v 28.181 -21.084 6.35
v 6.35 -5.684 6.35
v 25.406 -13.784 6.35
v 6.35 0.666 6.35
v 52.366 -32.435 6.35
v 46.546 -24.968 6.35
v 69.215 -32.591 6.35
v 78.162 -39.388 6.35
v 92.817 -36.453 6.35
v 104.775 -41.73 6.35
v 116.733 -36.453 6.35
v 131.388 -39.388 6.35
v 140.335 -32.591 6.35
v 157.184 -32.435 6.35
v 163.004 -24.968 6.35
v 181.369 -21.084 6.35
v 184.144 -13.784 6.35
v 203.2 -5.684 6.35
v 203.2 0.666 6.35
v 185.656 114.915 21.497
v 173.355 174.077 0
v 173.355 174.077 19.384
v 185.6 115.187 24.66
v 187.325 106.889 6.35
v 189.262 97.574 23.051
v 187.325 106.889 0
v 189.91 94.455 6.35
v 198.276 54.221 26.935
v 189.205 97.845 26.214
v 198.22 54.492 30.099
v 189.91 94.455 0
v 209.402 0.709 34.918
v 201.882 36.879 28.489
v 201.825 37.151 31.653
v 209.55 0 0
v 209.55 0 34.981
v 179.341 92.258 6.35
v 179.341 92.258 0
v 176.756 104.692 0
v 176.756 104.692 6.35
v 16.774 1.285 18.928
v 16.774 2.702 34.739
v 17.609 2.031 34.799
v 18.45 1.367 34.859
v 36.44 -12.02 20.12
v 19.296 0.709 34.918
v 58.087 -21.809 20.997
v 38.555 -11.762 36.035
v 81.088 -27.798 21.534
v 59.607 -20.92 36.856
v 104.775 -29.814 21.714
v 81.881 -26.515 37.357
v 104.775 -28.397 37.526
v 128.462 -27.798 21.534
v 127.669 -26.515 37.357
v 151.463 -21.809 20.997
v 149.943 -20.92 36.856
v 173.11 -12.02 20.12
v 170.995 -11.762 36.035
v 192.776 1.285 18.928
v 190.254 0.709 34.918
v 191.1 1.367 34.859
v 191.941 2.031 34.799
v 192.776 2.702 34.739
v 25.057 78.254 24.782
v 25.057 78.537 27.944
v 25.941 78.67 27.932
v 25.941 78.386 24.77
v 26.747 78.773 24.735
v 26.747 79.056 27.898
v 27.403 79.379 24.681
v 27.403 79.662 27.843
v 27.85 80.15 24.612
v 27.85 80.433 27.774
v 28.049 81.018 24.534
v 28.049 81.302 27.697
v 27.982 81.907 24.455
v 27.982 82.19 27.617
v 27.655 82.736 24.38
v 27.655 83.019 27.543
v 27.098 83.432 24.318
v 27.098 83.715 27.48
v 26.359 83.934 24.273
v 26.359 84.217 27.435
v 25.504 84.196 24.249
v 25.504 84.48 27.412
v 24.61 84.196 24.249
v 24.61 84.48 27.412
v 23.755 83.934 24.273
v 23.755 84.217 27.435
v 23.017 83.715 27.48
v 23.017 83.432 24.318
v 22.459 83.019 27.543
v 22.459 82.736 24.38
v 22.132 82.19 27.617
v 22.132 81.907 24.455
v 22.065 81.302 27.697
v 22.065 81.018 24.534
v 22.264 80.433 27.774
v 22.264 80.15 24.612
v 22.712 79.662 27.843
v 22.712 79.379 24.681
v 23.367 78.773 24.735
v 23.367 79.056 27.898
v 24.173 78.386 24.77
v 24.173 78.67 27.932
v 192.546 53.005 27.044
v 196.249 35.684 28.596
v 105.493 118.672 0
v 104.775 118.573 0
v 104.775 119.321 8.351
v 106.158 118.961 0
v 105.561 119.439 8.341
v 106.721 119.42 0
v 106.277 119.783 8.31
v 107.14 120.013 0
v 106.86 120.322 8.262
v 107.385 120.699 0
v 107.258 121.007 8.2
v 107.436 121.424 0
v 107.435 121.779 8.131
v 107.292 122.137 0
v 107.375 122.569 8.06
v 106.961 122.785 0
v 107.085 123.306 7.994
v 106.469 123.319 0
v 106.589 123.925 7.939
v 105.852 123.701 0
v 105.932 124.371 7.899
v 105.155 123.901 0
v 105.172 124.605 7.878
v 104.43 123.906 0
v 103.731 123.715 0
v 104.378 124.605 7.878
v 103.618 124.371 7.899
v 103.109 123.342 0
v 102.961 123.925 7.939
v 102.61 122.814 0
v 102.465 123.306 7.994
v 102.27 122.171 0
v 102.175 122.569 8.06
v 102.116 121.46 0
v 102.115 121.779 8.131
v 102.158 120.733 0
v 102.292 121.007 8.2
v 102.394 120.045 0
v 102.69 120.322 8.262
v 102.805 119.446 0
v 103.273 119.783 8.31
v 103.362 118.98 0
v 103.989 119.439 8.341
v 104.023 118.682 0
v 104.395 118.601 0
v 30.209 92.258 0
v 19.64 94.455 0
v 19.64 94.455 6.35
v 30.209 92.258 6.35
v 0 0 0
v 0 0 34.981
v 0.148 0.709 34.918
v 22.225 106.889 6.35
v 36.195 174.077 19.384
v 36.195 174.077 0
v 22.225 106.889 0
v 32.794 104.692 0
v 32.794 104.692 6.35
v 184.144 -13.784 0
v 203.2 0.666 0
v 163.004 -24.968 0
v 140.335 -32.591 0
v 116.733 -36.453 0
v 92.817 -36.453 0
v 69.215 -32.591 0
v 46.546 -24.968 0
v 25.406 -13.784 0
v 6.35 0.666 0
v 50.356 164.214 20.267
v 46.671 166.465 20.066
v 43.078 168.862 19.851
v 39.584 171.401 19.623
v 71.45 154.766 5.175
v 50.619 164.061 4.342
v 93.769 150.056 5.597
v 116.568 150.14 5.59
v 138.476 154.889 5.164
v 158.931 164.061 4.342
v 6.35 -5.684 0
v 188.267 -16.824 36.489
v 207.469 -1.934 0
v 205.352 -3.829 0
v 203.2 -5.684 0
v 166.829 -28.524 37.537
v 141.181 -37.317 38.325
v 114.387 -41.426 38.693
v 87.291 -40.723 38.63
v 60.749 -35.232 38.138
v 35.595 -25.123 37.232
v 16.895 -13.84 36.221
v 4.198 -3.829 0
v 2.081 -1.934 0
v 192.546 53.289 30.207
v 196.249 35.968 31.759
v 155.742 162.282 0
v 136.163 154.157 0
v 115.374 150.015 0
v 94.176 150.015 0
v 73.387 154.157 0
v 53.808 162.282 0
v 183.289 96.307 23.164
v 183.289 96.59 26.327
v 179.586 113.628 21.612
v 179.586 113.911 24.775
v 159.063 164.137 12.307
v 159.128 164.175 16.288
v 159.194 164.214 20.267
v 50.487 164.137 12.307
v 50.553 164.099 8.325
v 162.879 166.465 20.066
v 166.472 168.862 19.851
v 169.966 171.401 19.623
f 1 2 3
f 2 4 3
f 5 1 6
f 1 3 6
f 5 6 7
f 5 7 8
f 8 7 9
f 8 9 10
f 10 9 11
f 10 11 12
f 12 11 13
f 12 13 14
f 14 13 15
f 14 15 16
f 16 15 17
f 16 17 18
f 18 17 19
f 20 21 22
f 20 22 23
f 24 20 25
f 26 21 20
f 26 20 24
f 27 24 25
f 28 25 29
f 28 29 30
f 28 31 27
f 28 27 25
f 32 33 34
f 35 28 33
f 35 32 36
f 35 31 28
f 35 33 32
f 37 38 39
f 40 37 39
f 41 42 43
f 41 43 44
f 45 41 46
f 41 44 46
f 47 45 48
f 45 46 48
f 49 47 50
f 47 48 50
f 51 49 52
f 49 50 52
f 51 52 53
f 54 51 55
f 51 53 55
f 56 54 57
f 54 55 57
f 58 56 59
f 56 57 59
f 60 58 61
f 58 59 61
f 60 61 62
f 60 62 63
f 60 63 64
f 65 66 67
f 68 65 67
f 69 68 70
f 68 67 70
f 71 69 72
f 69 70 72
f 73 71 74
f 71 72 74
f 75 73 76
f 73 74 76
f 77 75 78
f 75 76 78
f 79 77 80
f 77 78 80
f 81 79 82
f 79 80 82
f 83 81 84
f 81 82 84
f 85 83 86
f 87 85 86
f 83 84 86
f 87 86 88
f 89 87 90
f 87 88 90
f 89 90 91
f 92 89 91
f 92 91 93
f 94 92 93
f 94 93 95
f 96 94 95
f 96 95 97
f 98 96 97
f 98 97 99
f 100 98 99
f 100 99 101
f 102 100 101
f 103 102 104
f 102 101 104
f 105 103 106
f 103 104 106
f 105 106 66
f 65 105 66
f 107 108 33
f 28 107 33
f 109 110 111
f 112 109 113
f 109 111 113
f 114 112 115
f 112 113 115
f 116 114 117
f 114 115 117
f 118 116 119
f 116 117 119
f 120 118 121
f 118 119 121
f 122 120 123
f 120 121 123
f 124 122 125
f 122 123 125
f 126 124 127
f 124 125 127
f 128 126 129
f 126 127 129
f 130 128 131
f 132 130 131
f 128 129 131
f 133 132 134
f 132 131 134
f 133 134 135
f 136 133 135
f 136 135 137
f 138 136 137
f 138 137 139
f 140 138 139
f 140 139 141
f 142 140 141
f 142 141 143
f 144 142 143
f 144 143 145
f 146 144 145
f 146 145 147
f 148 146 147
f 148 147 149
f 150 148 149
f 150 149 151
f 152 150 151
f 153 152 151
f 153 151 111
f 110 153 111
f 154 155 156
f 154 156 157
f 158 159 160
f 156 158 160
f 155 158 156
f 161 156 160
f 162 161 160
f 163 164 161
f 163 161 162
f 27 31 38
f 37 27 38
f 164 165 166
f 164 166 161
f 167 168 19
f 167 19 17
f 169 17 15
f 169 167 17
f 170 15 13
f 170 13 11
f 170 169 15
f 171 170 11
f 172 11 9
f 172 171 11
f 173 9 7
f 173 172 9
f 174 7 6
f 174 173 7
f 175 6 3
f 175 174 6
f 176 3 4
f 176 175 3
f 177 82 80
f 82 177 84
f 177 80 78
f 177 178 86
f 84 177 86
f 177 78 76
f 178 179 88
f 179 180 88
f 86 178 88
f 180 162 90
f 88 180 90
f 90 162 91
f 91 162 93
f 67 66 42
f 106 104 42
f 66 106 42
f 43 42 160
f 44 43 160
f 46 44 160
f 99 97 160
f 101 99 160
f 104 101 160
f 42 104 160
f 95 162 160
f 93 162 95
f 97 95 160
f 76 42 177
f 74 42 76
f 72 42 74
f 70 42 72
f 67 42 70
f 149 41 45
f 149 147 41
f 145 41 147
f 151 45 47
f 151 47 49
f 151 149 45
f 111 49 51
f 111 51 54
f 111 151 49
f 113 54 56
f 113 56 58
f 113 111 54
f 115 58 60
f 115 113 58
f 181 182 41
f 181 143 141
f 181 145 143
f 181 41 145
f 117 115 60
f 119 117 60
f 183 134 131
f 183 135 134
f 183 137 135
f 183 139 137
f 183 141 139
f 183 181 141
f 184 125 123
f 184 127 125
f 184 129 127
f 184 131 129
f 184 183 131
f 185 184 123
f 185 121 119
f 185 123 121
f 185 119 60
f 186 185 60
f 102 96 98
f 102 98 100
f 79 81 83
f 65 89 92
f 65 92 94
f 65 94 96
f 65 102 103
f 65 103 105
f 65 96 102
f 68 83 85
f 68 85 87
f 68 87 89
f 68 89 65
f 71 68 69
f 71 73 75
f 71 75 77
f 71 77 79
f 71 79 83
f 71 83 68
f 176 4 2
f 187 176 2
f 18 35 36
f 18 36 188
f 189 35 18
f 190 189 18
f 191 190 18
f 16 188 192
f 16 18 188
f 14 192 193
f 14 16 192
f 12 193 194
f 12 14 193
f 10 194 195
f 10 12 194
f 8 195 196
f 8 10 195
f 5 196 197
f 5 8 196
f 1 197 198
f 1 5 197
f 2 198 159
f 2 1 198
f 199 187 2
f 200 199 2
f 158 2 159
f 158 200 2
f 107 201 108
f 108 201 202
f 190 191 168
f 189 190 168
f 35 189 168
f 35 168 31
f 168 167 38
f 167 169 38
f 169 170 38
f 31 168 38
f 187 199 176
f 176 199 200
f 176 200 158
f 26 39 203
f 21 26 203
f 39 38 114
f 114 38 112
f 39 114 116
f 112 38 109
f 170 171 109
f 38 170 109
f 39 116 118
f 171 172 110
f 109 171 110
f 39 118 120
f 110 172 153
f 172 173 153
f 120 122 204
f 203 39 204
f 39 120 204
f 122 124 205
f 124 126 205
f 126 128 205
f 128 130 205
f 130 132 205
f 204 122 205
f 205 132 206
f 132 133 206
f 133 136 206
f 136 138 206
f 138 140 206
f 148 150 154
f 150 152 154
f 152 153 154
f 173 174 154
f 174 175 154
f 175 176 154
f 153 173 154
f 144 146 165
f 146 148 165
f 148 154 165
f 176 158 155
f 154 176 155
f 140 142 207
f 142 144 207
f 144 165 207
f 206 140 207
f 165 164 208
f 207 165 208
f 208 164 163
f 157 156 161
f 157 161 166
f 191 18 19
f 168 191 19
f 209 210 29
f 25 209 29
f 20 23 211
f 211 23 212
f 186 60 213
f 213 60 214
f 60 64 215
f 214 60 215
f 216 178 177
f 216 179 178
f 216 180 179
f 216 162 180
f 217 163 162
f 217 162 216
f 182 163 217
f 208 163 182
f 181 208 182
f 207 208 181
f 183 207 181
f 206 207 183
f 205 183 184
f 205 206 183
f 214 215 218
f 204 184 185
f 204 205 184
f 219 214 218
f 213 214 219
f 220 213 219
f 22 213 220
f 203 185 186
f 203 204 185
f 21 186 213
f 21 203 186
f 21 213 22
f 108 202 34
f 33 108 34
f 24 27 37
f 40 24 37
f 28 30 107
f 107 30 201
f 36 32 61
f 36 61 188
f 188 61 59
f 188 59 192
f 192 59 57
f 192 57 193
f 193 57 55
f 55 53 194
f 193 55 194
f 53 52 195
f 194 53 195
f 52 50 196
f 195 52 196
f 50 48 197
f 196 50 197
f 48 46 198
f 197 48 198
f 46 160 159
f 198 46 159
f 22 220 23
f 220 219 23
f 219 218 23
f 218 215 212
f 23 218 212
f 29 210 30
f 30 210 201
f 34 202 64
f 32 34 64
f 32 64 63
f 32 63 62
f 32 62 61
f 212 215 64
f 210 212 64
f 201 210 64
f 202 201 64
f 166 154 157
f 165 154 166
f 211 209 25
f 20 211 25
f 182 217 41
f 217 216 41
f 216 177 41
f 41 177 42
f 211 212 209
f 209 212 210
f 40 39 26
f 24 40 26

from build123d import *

# Parameters (mm, degrees)
BOSS_EXTRUDE1_DEPTH     = 209.55
SKETCH1_W               = 240.510539239
SKETCH1_H               = 265.827438106
CUT_EXTRUDE1_DEPTH      = 41.01815501
CUT_EXTRUDE1_DEPTH_BACK = 1
CUT_EXTRUDE2_DEPTH      = 15.875
CUT_EXTRUDE3_DEPTH      = 3.175
SKETCH5_R               = 3
CUT_EXTRUDE4_DEPTH      = 3.175
CUT_EXTRUDE7_DEPTH      = 3.175
CUT_EXTRUDE7_DEPTH_BACK = 6.35
SKETCH7_R               = 2.667
CUT_EXTRUDE8_DEPTH      = 23.690934342
CUT_EXTRUDE9_DEPTH      = 6.35


with BuildPart() as part:
    # Sketch2 → Boss-Extrude1 (new body)
    with BuildSketch(Plane(origin=(0, 0, 0), x_dir=(0, 0, -1), z_dir=(1, 0, 0))):
        Polygon((-19.05, 177.8), (-34.91779298, 0.709477538), (-40.01815501, -56.212476111), (0, -53.790492508), (0, 0), (0, 177.8), align=None)
    extrude(amount=BOSS_EXTRUDE1_DEPTH)

    # Sketch1 → Cut-Extrude1 (cut, two sides)
    with BuildSketch(Plane.XY) as cut_extrude1_sk:
        with Locations((107.411926899, 58.758625739)):
            Rectangle(SKETCH1_W, SKETCH1_H)
        with BuildLine():
            Line((0, 0), (36.195, 174.07688524))
            ThreePointArc((36.195, 174.07688524), (104.775, 149.493461876), (173.355, 174.07688524))
            Line((173.355, 174.07688524), (209.55, 0))
            ThreePointArc((209.55, 0), (104.775, -41.729500882), (0, 0))
        make_face(mode=Mode.SUBTRACT)
    extrude(amount=CUT_EXTRUDE1_DEPTH, mode=Mode.SUBTRACT)
    extrude(cut_extrude1_sk.sketch, amount=-CUT_EXTRUDE1_DEPTH_BACK, mode=Mode.SUBTRACT)

    # Sketch3 → Cut-Extrude2 (cut)
    with BuildSketch(Plane(origin=(0, 3.474785103, 34.670013893), x_dir=(1, 0, 0), z_dir=(0, 0.08924518, 0.996009688))):
        with BuildLine():
            Line((92.029425275, 362.610535175), (16.77359238, -0.776250458))
            ThreePointArc((16.77359238, -0.776250458), (104.775, -31.999740282), (192.77640762, -0.776250458))
            Line((192.77640762, -0.776250458), (117.520574725, 362.610535175))
            Line((117.520574725, 362.610535175), (92.029425275, 362.610535175))
        make_face()
    extrude(amount=-CUT_EXTRUDE2_DEPTH, mode=Mode.SUBTRACT)

    # Sketch4 → Cut-Extrude3 (cut)
    with BuildSketch(Plane(origin=(0, 3.109460703, 34.702747954), x_dir=(1, 0, 0), z_dir=(0, 0.08924518, 0.996009688))):
        Polygon((185.970172739, 112.605103669), (179.585708922, 111.245651158), (183.288614458, 93.855513419), (189.673078275, 95.21496593), align=None)
        Polygon((198.756641777, 51.702635333), (192.545878299, 50.380169071), (196.248783835, 32.990031331), (202.459547313, 34.312497594), align=None)
    extrude(amount=-CUT_EXTRUDE3_DEPTH, mode=Mode.SUBTRACT)

    # Sketch5 → Cut-Extrude4 (cut)
    with BuildSketch(Plane(origin=(0, 3.109460703, 34.702747954), x_dir=(1, 0, 0), z_dir=(0, 0.08924518, 0.996009688))):
        with Locations(Location((25.057058463, 78.729771517, 0), (0, 0, 270))):  # turned: the seam where the file's is
            Circle(SKETCH5_R)
    extrude(amount=-CUT_EXTRUDE4_DEPTH, mode=Mode.SUBTRACT)

    # Sketch6 → Cut-Extrude7 (cut, two sides)
    with BuildSketch(Plane(origin=(0, 0, 0), x_dir=(-1, 0, 0), z_dir=(0, 0, -1))) as cut_extrude7_sk:
        with BuildLine():
            Line((-203.2, -5.683612864), (-203.2, 0.666387136))
            ThreePointArc((-203.2, 0.666387136), (-104.775, -36.938393832), (-6.35, 0.666387136))
            Line((-6.35, 0.666387136), (-6.35, -5.683612864))
            ThreePointArc((-6.35, -5.683612864), (-104.775, -63.961814377), (-203.2, -5.683612864))
        make_face()
    extrude(amount=CUT_EXTRUDE7_DEPTH, mode=Mode.SUBTRACT)
    extrude(cut_extrude7_sk.sketch, amount=-CUT_EXTRUDE7_DEPTH_BACK, mode=Mode.SUBTRACT)

    # Sketch7 → Cut-Extrude8 (cut, through all)
    with BuildSketch(Plane(origin=(0, 1.692693472, 18.891094163), x_dir=(1, 0, 0), z_dir=(0, 0.08924518, 0.996009688))):
        with Locations(Location((104.775, 120.767047718, 0), (0, 0, 270))):  # turned: the seam where the file's is
            Circle(SKETCH7_R)
    extrude(amount=-CUT_EXTRUDE8_DEPTH, mode=Mode.SUBTRACT)

    # Sketch8 → Cut-Extrude9 (cut)
    with BuildSketch(Plane(origin=(0, 0, 0), x_dir=(-1, 0, 0), z_dir=(0, 0, -1))):
        Polygon((-187.325, 106.889315498), (-189.910357143, 94.455252267), (-179.341403396, 92.257698696), (-176.756046253, 104.691761927), align=None)
        Polygon((-32.793953747, 104.691761927), (-22.225, 106.889315498), (-19.639642857, 94.455252267), (-30.208596604, 92.257698696), align=None)
    extrude(amount=-CUT_EXTRUDE9_DEPTH, mode=Mode.SUBTRACT)


solid = part.part
